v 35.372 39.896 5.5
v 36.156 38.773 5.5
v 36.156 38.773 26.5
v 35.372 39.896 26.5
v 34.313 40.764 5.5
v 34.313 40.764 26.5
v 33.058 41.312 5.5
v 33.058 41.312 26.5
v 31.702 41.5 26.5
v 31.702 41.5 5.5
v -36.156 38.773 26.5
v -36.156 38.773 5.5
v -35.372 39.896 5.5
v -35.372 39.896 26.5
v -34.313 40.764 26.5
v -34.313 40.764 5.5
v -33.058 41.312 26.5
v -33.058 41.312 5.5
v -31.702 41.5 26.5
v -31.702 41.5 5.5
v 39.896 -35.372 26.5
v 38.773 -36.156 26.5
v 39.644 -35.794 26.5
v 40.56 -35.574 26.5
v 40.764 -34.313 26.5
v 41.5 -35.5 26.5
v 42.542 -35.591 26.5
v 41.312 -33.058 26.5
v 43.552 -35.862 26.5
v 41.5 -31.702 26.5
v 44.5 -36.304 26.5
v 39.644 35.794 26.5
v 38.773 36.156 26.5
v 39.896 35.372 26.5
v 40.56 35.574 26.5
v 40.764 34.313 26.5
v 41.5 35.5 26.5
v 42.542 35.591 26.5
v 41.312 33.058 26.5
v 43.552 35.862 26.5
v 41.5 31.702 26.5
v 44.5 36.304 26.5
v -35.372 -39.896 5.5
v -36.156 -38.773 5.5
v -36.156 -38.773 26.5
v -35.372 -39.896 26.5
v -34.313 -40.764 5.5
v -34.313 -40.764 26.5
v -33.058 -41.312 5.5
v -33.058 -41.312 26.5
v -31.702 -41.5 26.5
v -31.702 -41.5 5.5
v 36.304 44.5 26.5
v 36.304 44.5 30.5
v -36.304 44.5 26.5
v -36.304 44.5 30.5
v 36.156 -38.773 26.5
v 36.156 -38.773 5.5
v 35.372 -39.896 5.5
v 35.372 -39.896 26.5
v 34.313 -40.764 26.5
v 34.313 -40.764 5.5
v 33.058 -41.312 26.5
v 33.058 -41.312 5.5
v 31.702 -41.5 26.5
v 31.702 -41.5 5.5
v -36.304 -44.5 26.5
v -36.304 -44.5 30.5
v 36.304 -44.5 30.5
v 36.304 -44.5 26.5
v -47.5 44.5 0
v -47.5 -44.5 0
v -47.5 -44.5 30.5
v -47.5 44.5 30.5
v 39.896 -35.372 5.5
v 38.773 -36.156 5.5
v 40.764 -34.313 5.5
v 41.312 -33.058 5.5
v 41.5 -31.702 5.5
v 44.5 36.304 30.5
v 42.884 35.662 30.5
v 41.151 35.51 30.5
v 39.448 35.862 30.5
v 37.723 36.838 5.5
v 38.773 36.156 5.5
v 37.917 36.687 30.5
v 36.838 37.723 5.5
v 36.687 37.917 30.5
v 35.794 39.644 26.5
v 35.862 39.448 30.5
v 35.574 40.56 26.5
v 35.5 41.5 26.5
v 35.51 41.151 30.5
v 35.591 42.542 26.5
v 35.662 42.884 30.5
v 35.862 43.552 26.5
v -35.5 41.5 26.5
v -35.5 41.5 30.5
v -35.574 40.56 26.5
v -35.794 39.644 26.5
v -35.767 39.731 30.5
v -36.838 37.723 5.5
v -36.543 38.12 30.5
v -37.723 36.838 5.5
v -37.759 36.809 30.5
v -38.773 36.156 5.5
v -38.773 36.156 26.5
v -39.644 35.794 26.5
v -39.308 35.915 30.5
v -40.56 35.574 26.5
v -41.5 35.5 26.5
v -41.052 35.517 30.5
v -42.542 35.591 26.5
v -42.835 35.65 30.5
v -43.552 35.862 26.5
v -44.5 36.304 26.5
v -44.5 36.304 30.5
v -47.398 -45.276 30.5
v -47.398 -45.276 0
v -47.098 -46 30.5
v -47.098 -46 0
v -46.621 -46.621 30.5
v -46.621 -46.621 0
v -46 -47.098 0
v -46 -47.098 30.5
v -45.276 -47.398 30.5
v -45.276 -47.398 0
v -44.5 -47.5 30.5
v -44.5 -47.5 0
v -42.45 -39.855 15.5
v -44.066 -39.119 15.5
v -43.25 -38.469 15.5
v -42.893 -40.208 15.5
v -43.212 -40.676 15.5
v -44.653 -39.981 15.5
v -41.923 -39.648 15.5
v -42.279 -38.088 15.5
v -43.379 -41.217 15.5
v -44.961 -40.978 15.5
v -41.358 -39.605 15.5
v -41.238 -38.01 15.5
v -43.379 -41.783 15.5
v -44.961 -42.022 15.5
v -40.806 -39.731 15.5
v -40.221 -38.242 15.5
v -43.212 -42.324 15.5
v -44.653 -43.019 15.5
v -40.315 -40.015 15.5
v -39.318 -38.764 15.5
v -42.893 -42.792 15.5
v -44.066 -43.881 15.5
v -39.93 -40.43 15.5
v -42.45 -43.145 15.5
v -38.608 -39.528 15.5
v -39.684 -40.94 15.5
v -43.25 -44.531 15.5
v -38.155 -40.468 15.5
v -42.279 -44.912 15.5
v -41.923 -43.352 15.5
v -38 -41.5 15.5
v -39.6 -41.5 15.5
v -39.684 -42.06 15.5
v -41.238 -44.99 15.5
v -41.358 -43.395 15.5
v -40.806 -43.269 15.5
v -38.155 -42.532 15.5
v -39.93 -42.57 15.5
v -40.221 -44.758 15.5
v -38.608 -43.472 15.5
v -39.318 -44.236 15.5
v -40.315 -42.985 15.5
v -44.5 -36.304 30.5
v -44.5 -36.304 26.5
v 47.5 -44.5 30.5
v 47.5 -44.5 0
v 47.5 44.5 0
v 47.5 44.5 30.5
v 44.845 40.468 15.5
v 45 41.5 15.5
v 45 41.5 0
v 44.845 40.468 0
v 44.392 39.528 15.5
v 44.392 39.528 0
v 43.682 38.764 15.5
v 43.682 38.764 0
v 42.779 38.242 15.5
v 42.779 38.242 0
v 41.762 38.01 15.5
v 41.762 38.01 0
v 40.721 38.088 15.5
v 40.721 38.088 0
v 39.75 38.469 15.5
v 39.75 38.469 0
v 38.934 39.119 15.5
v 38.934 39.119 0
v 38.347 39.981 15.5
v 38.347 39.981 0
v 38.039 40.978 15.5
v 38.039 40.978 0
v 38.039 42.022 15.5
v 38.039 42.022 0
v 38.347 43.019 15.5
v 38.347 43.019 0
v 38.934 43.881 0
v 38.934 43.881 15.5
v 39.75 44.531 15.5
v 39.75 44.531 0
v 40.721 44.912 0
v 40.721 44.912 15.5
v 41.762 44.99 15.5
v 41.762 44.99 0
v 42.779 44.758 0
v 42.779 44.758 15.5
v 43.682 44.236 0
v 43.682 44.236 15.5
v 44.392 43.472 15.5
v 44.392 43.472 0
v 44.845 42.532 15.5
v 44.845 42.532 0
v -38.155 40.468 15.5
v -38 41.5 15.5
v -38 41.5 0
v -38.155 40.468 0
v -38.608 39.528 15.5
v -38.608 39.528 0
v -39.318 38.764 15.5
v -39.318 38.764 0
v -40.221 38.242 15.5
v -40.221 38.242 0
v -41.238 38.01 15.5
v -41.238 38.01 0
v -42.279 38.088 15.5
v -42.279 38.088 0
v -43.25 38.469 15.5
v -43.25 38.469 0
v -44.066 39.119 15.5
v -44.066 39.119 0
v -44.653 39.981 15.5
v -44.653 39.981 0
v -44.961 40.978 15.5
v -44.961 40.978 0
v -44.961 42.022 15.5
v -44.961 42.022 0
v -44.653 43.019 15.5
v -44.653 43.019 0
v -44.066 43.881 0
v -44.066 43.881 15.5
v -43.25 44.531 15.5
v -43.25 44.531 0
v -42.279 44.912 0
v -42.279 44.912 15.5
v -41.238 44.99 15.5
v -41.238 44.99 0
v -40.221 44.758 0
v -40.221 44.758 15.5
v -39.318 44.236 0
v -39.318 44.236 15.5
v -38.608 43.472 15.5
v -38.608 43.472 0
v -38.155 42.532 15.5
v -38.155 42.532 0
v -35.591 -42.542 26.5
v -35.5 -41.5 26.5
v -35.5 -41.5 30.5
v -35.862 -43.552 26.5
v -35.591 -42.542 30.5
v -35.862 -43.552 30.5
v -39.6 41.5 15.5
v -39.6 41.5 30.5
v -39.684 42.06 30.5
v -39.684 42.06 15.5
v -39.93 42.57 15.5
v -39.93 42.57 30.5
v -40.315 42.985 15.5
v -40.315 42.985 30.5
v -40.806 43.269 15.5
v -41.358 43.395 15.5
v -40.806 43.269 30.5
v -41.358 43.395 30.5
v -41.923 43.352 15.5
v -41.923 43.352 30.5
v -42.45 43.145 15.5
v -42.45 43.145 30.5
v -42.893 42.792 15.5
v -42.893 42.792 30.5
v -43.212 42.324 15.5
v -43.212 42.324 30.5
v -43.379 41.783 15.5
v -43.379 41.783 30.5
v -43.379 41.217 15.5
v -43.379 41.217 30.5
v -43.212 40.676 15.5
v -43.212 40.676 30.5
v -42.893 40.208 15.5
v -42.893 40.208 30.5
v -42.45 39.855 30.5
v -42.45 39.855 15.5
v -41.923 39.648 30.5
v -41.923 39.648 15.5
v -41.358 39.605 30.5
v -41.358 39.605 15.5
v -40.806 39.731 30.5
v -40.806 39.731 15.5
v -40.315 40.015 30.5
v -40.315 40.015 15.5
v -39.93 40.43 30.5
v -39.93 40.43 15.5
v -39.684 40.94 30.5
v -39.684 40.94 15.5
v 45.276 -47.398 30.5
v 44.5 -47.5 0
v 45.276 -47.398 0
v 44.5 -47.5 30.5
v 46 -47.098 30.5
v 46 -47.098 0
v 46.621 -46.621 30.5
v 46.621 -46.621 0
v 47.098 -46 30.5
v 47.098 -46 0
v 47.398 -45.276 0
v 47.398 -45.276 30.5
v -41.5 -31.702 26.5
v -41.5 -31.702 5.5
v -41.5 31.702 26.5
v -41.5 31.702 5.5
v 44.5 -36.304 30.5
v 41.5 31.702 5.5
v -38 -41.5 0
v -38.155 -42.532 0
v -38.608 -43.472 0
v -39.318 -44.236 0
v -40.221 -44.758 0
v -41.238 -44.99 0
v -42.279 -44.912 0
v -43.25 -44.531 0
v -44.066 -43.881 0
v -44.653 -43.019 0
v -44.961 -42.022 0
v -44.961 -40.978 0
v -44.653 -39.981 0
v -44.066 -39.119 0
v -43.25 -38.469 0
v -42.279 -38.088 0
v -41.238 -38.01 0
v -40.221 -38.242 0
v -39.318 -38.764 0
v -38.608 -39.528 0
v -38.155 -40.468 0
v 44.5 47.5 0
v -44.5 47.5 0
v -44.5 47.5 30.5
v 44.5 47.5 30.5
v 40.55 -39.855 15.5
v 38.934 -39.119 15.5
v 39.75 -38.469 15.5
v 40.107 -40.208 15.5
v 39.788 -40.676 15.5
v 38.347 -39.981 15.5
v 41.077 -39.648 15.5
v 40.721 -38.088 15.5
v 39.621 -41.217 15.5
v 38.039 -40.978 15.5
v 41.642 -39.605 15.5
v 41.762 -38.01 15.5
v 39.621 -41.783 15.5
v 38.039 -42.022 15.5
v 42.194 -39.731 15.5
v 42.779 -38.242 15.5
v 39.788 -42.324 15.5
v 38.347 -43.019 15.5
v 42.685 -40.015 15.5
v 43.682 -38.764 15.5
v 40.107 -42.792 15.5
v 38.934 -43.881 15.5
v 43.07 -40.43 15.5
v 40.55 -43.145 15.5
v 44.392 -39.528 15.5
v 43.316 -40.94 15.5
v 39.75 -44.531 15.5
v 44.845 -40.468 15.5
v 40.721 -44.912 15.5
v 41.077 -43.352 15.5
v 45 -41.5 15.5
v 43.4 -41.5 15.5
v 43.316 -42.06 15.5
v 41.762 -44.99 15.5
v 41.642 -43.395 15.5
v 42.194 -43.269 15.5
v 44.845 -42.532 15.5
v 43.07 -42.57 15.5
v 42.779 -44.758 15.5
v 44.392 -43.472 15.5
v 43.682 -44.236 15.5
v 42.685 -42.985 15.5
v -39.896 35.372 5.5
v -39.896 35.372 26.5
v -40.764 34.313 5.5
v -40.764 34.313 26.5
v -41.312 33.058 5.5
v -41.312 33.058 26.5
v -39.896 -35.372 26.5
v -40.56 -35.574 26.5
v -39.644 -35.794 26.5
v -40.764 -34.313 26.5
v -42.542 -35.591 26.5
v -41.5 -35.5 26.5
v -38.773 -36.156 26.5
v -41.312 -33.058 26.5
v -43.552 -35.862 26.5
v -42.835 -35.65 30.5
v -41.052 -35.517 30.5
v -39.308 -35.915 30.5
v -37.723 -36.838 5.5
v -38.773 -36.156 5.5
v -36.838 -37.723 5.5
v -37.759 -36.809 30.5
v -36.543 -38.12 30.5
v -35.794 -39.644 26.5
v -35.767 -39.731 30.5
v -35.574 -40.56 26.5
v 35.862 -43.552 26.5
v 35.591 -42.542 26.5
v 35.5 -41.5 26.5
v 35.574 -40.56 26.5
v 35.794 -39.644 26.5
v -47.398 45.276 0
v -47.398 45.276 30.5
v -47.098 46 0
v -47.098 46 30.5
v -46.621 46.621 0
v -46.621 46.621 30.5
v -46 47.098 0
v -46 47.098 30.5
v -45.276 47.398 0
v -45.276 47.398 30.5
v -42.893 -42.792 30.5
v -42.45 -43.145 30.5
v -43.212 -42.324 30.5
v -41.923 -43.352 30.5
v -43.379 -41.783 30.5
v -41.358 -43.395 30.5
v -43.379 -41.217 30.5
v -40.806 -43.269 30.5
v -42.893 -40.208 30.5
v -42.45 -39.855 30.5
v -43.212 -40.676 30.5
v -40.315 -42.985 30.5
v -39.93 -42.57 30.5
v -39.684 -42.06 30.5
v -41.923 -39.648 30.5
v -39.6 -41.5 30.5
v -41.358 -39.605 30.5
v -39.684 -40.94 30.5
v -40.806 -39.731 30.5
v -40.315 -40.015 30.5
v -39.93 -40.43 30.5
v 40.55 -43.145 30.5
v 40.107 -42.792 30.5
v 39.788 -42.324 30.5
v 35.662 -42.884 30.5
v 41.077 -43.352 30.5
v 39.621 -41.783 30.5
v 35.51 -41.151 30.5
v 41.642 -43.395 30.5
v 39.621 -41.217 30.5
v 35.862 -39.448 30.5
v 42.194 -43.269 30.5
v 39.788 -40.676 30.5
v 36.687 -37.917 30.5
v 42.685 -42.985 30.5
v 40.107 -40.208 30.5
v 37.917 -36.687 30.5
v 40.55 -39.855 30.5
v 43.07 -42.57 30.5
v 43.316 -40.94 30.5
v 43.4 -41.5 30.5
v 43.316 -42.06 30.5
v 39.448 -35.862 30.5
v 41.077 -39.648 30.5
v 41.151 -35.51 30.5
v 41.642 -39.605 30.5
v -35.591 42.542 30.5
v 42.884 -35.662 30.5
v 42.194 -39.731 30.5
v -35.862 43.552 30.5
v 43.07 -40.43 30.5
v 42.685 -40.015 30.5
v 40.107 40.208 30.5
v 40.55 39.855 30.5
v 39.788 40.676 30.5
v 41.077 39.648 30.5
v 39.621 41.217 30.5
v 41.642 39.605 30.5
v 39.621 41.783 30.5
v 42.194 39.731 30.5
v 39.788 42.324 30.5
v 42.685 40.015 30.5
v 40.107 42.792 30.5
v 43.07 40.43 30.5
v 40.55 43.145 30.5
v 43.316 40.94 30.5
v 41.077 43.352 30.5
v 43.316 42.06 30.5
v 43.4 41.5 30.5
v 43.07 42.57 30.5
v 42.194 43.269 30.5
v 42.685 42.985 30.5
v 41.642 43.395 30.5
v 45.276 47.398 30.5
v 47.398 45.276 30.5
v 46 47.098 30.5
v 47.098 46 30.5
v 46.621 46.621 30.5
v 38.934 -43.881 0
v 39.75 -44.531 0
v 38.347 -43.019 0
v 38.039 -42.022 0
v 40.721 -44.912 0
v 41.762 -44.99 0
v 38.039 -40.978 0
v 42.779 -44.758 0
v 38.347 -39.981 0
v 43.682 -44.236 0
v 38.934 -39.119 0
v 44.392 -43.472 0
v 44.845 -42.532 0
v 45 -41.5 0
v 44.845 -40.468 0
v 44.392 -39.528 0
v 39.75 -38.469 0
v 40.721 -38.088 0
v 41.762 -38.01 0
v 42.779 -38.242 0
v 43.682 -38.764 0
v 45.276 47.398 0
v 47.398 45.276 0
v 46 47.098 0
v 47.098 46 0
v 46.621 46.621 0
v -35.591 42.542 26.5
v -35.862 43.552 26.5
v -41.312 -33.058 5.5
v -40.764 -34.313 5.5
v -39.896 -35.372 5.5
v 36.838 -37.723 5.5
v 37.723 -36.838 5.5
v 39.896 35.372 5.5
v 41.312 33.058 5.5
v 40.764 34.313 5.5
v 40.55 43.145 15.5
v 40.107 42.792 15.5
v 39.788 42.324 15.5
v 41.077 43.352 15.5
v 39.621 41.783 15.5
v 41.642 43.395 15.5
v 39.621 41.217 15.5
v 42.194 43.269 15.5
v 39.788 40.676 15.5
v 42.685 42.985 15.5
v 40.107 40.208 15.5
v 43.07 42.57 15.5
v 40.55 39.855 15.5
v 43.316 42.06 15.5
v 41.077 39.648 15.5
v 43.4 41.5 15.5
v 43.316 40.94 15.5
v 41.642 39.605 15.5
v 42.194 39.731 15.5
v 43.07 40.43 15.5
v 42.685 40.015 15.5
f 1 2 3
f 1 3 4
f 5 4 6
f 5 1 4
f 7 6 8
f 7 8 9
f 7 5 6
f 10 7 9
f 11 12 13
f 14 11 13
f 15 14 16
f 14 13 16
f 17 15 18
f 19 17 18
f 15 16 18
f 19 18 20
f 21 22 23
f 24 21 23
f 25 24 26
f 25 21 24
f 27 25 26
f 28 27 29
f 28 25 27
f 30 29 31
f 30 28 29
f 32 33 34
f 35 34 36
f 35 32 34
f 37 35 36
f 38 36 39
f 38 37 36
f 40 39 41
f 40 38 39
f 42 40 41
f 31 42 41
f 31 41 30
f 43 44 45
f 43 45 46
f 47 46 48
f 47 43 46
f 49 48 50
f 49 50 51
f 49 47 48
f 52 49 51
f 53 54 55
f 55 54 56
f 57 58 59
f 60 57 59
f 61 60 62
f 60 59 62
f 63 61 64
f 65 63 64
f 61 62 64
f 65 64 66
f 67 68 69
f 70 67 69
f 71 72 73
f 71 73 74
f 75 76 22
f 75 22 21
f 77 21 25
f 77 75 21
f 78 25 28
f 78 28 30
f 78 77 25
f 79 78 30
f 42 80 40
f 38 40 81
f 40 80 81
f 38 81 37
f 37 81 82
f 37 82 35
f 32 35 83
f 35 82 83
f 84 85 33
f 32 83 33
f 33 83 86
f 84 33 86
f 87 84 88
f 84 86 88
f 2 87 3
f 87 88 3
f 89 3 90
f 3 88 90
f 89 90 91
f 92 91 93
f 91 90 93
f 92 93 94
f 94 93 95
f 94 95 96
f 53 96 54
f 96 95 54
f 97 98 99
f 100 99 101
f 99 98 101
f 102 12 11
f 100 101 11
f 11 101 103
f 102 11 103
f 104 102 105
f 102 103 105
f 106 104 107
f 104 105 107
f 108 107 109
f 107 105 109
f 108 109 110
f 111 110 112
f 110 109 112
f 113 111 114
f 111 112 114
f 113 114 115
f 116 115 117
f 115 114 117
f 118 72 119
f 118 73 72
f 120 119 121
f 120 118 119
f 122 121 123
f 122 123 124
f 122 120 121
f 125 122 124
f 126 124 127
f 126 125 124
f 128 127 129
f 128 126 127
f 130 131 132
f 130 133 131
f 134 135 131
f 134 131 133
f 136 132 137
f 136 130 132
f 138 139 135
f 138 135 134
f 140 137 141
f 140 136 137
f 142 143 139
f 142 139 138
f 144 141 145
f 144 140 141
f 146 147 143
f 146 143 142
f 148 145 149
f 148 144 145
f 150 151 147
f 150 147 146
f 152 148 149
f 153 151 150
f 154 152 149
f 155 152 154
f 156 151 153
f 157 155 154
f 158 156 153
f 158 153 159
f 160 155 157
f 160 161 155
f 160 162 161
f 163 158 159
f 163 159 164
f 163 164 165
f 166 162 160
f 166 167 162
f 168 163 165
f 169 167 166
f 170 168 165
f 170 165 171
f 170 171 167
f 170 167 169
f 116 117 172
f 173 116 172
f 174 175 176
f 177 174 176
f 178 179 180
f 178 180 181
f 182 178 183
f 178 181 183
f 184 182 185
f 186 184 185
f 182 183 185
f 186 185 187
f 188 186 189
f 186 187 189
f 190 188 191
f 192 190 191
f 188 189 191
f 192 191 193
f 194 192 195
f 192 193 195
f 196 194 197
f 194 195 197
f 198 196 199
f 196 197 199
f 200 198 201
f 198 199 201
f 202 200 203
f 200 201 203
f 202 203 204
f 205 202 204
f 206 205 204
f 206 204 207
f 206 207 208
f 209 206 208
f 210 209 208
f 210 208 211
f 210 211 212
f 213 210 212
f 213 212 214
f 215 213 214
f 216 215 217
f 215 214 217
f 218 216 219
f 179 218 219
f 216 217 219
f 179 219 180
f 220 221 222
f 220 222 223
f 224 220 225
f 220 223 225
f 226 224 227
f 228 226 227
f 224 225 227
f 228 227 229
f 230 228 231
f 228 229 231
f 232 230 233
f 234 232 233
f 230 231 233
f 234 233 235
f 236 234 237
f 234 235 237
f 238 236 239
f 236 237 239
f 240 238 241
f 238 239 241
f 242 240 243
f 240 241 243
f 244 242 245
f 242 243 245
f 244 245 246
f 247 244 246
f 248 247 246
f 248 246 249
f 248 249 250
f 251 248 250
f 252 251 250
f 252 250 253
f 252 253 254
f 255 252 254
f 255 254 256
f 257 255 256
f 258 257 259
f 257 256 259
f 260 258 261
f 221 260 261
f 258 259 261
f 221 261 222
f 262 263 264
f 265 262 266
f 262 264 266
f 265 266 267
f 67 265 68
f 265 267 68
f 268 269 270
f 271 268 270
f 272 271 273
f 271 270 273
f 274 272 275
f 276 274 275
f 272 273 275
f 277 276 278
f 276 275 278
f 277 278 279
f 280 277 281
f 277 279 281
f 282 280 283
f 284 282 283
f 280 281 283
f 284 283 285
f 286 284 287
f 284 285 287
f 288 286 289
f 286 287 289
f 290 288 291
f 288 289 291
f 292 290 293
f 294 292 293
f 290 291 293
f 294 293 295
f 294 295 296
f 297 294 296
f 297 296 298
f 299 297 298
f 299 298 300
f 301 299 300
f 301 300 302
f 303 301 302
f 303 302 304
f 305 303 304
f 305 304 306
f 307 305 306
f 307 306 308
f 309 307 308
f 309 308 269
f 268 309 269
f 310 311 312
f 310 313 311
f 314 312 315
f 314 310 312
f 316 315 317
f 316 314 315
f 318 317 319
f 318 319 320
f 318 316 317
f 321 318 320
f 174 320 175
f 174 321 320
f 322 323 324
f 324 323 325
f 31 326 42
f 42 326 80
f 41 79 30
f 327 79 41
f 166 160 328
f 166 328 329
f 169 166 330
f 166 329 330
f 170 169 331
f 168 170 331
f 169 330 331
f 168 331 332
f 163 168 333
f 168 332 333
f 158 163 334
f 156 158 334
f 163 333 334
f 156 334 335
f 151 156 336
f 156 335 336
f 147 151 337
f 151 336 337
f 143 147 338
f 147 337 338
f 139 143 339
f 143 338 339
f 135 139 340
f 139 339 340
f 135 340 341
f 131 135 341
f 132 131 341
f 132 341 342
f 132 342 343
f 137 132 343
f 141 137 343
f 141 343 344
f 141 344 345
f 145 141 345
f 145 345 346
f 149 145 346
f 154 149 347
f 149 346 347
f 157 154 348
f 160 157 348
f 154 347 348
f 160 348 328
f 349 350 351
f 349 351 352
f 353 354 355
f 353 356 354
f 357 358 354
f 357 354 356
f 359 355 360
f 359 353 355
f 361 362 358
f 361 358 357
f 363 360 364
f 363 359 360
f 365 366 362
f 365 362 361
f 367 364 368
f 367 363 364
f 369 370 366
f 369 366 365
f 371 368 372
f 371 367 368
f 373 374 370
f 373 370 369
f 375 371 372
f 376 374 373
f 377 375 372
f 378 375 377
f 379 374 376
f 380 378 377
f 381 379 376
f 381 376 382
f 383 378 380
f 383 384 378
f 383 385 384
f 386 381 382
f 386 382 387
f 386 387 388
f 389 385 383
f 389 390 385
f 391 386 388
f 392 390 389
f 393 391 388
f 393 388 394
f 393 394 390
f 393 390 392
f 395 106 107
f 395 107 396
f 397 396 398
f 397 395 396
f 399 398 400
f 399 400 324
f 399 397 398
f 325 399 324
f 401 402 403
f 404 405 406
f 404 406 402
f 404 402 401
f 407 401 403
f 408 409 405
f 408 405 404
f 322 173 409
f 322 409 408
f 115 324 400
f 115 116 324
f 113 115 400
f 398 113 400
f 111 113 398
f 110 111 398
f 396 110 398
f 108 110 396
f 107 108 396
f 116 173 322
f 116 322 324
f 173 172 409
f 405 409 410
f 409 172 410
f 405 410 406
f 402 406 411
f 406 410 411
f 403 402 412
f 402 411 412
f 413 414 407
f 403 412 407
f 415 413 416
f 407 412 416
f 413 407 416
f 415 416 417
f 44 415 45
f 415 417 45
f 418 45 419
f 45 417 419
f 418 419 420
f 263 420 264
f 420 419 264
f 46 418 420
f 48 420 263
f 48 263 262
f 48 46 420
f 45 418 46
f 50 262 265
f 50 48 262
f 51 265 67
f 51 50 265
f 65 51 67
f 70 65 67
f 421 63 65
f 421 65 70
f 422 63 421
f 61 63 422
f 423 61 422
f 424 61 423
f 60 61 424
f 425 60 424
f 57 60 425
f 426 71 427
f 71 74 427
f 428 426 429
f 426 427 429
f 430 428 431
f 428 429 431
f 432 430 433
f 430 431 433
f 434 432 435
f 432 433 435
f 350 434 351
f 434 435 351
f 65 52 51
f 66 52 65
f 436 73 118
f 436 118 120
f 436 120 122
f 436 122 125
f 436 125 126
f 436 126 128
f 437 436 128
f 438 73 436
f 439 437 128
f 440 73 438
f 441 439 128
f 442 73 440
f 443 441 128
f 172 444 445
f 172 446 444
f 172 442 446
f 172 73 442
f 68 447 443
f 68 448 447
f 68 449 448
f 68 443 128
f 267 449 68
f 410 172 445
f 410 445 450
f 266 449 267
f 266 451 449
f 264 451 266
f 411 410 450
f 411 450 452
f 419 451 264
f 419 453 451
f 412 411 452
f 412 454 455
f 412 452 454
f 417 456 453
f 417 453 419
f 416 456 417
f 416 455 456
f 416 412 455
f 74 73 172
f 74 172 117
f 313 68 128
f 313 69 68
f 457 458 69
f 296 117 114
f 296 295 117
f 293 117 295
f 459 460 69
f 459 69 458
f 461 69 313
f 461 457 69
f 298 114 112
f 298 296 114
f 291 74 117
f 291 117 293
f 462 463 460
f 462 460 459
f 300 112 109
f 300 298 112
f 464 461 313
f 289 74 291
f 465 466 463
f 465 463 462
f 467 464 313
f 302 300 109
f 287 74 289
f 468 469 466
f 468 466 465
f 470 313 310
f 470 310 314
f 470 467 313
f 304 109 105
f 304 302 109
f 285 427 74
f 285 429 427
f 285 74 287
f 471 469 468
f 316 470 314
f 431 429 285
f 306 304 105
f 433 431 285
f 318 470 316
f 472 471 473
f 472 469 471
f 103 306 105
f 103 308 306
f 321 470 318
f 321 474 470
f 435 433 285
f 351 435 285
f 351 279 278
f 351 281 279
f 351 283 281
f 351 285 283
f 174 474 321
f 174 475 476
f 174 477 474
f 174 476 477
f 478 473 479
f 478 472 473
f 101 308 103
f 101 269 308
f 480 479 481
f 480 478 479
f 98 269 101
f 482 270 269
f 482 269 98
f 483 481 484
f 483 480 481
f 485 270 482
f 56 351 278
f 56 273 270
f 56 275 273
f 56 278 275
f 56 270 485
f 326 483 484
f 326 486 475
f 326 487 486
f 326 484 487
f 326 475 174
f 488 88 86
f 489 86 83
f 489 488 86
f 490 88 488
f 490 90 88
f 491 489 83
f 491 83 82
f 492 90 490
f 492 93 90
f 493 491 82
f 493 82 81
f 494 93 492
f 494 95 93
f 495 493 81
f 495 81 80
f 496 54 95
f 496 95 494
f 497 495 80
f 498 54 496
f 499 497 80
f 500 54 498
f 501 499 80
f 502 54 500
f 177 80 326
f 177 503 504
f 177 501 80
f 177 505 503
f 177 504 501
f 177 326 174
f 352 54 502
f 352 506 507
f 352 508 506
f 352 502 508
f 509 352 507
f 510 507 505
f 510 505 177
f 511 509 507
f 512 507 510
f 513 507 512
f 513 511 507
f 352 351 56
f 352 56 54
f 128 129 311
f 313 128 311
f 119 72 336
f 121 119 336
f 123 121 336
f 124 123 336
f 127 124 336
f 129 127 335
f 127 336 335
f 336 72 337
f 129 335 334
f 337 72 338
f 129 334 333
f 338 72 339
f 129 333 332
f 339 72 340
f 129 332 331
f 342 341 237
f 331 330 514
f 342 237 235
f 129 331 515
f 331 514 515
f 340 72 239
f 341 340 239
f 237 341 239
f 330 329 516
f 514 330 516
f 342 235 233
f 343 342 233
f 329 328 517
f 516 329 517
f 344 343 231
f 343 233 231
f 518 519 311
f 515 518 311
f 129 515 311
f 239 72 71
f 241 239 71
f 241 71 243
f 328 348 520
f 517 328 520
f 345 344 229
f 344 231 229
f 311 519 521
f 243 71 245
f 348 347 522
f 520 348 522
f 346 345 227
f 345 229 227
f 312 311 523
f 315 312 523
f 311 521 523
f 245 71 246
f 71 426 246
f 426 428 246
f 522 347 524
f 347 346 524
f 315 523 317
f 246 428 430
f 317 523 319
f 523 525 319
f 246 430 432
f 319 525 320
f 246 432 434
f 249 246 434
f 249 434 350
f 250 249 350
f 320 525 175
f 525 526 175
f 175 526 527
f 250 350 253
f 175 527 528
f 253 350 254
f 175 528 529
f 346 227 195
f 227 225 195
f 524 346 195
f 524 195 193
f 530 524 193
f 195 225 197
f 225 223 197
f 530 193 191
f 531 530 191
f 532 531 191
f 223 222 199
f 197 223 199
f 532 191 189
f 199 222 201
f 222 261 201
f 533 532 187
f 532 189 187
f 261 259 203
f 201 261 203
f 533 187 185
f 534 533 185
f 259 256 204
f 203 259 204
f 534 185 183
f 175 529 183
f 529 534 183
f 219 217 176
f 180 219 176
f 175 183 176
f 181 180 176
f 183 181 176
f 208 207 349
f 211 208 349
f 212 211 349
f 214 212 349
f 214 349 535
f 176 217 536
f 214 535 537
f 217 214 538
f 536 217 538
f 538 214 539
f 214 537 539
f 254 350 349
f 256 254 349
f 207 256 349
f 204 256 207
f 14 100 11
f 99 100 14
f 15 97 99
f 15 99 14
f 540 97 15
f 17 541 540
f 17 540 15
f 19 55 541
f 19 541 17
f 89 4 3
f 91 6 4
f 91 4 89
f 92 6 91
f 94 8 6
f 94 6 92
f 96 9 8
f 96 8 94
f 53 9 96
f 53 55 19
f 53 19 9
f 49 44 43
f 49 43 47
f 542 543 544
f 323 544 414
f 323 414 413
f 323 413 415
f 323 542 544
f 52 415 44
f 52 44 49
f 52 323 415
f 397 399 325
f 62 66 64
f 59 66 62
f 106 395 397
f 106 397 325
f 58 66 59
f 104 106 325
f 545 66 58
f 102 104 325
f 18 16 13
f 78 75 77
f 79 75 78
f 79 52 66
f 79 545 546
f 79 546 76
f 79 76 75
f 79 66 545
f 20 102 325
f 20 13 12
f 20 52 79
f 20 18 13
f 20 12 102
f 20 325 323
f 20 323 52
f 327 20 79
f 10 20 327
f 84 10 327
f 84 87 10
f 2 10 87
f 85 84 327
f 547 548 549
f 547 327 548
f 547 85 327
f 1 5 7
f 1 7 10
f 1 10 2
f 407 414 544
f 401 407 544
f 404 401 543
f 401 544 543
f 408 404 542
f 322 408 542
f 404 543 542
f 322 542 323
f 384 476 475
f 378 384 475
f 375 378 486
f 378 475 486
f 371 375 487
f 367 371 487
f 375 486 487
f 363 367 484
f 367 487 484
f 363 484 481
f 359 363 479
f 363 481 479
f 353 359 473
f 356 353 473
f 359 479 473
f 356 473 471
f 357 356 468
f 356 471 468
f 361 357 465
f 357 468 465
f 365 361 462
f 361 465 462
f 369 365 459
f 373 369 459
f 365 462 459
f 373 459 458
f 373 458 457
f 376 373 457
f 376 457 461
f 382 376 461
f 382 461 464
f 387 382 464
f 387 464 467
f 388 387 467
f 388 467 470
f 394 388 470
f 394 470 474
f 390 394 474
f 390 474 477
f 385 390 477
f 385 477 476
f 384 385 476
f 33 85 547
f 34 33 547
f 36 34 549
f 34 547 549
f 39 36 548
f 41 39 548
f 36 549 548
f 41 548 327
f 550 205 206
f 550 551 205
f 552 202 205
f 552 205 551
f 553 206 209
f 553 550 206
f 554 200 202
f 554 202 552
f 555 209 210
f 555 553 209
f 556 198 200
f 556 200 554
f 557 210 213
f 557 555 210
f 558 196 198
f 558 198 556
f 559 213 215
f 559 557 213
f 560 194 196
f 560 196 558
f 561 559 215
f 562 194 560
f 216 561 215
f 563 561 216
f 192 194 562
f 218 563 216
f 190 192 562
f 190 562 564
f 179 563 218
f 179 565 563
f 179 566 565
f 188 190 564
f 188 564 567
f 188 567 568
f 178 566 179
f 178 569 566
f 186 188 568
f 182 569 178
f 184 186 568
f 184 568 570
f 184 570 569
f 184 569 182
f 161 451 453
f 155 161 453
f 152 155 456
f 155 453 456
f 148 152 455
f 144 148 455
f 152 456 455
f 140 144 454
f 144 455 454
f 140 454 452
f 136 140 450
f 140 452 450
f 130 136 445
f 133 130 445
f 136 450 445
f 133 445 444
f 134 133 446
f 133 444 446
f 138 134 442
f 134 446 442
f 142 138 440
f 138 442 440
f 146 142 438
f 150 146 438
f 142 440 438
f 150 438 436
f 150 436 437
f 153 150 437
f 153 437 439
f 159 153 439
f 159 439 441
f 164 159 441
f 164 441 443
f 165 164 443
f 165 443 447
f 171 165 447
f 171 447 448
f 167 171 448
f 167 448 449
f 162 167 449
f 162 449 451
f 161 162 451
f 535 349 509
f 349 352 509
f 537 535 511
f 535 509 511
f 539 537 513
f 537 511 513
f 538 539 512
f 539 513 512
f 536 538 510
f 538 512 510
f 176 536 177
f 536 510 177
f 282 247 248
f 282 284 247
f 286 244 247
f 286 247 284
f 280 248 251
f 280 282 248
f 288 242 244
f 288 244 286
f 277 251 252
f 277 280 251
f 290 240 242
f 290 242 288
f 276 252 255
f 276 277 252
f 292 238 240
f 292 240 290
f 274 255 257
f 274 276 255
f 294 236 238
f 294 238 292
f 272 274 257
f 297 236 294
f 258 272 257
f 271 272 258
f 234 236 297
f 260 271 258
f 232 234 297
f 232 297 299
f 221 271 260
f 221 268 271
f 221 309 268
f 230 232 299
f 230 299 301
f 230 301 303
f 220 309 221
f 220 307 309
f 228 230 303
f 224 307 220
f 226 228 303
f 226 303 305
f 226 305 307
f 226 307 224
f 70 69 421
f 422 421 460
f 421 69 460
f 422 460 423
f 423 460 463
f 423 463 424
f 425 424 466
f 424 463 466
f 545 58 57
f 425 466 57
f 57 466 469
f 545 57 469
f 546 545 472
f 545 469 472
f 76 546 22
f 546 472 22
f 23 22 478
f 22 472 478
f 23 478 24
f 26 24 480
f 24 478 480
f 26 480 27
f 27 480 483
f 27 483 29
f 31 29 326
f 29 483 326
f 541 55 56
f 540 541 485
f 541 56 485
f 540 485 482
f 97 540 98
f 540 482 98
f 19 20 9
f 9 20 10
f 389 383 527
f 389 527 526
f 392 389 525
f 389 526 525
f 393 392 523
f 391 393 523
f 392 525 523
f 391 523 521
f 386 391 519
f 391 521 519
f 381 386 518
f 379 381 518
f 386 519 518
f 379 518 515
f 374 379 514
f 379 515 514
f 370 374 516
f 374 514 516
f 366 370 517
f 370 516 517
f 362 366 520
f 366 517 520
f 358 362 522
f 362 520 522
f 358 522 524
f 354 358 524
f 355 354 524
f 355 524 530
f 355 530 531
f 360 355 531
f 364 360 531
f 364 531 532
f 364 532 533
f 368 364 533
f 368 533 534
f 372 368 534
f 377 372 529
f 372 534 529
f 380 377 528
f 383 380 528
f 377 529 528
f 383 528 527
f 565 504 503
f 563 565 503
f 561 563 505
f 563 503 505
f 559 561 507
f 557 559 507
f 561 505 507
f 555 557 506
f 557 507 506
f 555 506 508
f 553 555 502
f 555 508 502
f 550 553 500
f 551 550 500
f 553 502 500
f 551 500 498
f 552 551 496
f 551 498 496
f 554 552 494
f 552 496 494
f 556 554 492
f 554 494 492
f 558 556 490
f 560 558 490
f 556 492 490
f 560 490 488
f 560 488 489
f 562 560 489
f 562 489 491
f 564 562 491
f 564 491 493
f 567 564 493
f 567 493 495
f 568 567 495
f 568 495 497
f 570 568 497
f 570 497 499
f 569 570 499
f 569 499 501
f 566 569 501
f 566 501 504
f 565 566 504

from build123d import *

# Parameters (mm, degrees)
F0_W        = 95
F0_H        = 95
F1_DEPTH    = 30.5
F3_DEPTH    = 25
F4_R        = 1.9
F5_DEPTH    = 30.501
F6_R        = 3
F7_W        = 72.6076951546
F7_H        = 3
F7_W_2      = 3
F7_H_2      = 72.6076951546
F8_DEPTH    = 21
F9_T1_DEPTH = 21
F10_R       = 3.5
F11_DEPTH   = 15.5


# Not quite as in the source:
# - a fillet or chamfer that OpenCascade refuses, or shapes differently, is made with other operations: its cross-section is extruded or revolved along the edge and cut away or added


with BuildPart() as f1:
    # F0 (on Top) → F1 (new body)
    with BuildSketch(Plane.XY):
        Rectangle(F0_W, F0_H)
    extrude(amount=F1_DEPTH)

    # F2 (on face) → F3 (cut)
    with BuildSketch(Plane.XY.offset(30.5)):
        with BuildLine():
            Line((36.3038475773, 44.5), (-36.3038475773, 44.5))
            ThreePointArc((-36.3038475773, 44.5), (-35.7044450423, 43.0529142706), (-35.5, 41.5))
            ThreePointArc((-35.5, 41.5), (-38.5, 36.3038475773), (-44.5, 36.3038475773))
            Line((-44.5, 36.3038475773), (-44.5, -36.3038475773))
            ThreePointArc((-44.5, -36.3038475773), (-38.5, -36.3038475773), (-35.5, -41.5))
            ThreePointArc((-35.5, -41.5), (-35.7044450423, -43.0529142706), (-36.3038475773, -44.5))
            Line((-36.3038475773, -44.5), (36.3038475773, -44.5))
            ThreePointArc((36.3038475773, -44.5), (37.2573593129, -37.2573593129), (44.5, -36.3038475773))
            Line((44.5, -36.3038475773), (44.5, 36.3038475773))
            ThreePointArc((44.5, 36.3038475773), (37.2573593129, 37.2573593129), (36.3038475773, 44.5))
        make_face()
    extrude(amount=-F3_DEPTH, mode=Mode.SUBTRACT)

    # F4 (on face) → F5 (cut, through all)
    with BuildSketch(Plane.XY.offset(30.5)):
        with Locations((-41.5, 41.5)):
            Circle(F4_R)
        with Locations((41.5, 41.5)):
            Circle(F4_R)
        with Locations((-41.5, -41.5)):
            Circle(F4_R)
        with Locations((41.5, -41.5)):
            Circle(F4_R)
    extrude(amount=-F5_DEPTH, mode=Mode.SUBTRACT)

    # F6
    f6_edges = [f1.edges().sort_by_distance(p)[0] for p in [
        (-47.5, 47.5, 15.25),
        (47.5, 47.5, 15.25),
        (-47.5, -47.5, 15.25),
        (47.5, -47.5, 15.25),
    ]]
    fillet(f6_edges, radius=F6_R)

    # F7 (on face) → F8 (join)
    with BuildSketch(Plane.XY.offset(5.5)):
        with Locations((0, 43)):
            Rectangle(F7_W, F7_H)
        with Locations((-43, 0)):
            Rectangle(F7_W_2, F7_H_2)
        with Locations((0, -43)):
            Rectangle(F7_W, F7_H)
        with Locations((43, 0)):
            Rectangle(F7_W_2, F7_H_2)
    extrude(amount=F8_DEPTH)

    # F9: fillet of radius 5 on 8 edges, made by hand

    # F9_s2 → F9_t1 (join)
    with BuildSketch(Plane.XY.offset(5.5)):
        with BuildLine():
            ThreePointArc((-36.155658743, 38.7727272727), (-34.3132058682, 40.7640143271), (-31.7020410289, 41.5))
            Line((-31.7020410289, 41.5), (-35.5, 41.5))
            ThreePointArc((-35.5, 41.5), (-35.6662170274, 40.0975107027), (-36.155658743, 38.7727272727))
        make_face()
        with BuildLine():
            ThreePointArc((-38.7727272727, 36.155658743), (-40.7640143271, 34.3132058682), (-41.5, 31.7020410289))
            Line((-41.5, 31.7020410289), (-41.5, 35.5))
            ThreePointArc((-41.5, 35.5), (-40.0975107027, 35.6662170274), (-38.7727272727, 36.155658743))
        make_face()
        with BuildLine():
            ThreePointArc((36.155658743, 38.7727272727), (34.3132058682, 40.7640143271), (31.7020410289, 41.5))
            Line((31.7020410289, 41.5), (35.5, 41.5))
            ThreePointArc((35.5, 41.5), (35.6662170274, 40.0975107027), (36.155658743, 38.7727272727))
        make_face()
        with BuildLine():
            ThreePointArc((38.7727272727, 36.155658743), (40.7640143271, 34.3132058682), (41.5, 31.7020410289))
            Line((41.5, 31.7020410289), (41.5, 35.5))
            ThreePointArc((41.5, 35.5), (40.0975107027, 35.6662170274), (38.7727272727, 36.155658743))
        make_face()
        with BuildLine():
            ThreePointArc((38.7727272727, -36.155658743), (40.7640143271, -34.3132058682), (41.5, -31.7020410289))
            Line((41.5, -31.7020410289), (41.5, -35.5))
            ThreePointArc((41.5, -35.5), (40.0975107027, -35.6662170274), (38.7727272727, -36.155658743))
        make_face()
        with BuildLine():
            ThreePointArc((36.155658743, -38.7727272727), (34.3132058682, -40.7640143271), (31.7020410289, -41.5))
            Line((31.7020410289, -41.5), (35.5, -41.5))
            ThreePointArc((35.5, -41.5), (35.6662170274, -40.0975107027), (36.155658743, -38.7727272727))
        make_face()
        with BuildLine():
            ThreePointArc((-38.7727272727, -36.155658743), (-40.7640143271, -34.3132058682), (-41.5, -31.7020410289))
            Line((-41.5, -31.7020410289), (-41.5, -35.5))
            ThreePointArc((-41.5, -35.5), (-40.0975107027, -35.6662170274), (-38.7727272727, -36.155658743))
        make_face()
        with BuildLine():
            ThreePointArc((-36.155658743, -38.7727272727), (-34.3132058682, -40.7640143271), (-31.7020410289, -41.5))
            Line((-31.7020410289, -41.5), (-35.5, -41.5))
            ThreePointArc((-35.5, -41.5), (-35.6662170274, -40.0975107027), (-36.155658743, -38.7727272727))
        make_face()
    extrude(amount=F9_T1_DEPTH)

    # F10 (on face) → F11 (cut)
    with BuildSketch(Plane(origin=(0, 0, 0), x_dir=(1, 0, 0), z_dir=(0, 0, -1))):
        with Locations((-41.5, 41.5)):
            Circle(F10_R)
        with Locations((41.5, 41.5)):
            Circle(F10_R)
        with Locations((-41.5, -41.5)):
            Circle(F10_R)
        with Locations((41.5, -41.5)):
            Circle(F10_R)
    extrude(amount=-F11_DEPTH, mode=Mode.SUBTRACT)


solid = f1.part
